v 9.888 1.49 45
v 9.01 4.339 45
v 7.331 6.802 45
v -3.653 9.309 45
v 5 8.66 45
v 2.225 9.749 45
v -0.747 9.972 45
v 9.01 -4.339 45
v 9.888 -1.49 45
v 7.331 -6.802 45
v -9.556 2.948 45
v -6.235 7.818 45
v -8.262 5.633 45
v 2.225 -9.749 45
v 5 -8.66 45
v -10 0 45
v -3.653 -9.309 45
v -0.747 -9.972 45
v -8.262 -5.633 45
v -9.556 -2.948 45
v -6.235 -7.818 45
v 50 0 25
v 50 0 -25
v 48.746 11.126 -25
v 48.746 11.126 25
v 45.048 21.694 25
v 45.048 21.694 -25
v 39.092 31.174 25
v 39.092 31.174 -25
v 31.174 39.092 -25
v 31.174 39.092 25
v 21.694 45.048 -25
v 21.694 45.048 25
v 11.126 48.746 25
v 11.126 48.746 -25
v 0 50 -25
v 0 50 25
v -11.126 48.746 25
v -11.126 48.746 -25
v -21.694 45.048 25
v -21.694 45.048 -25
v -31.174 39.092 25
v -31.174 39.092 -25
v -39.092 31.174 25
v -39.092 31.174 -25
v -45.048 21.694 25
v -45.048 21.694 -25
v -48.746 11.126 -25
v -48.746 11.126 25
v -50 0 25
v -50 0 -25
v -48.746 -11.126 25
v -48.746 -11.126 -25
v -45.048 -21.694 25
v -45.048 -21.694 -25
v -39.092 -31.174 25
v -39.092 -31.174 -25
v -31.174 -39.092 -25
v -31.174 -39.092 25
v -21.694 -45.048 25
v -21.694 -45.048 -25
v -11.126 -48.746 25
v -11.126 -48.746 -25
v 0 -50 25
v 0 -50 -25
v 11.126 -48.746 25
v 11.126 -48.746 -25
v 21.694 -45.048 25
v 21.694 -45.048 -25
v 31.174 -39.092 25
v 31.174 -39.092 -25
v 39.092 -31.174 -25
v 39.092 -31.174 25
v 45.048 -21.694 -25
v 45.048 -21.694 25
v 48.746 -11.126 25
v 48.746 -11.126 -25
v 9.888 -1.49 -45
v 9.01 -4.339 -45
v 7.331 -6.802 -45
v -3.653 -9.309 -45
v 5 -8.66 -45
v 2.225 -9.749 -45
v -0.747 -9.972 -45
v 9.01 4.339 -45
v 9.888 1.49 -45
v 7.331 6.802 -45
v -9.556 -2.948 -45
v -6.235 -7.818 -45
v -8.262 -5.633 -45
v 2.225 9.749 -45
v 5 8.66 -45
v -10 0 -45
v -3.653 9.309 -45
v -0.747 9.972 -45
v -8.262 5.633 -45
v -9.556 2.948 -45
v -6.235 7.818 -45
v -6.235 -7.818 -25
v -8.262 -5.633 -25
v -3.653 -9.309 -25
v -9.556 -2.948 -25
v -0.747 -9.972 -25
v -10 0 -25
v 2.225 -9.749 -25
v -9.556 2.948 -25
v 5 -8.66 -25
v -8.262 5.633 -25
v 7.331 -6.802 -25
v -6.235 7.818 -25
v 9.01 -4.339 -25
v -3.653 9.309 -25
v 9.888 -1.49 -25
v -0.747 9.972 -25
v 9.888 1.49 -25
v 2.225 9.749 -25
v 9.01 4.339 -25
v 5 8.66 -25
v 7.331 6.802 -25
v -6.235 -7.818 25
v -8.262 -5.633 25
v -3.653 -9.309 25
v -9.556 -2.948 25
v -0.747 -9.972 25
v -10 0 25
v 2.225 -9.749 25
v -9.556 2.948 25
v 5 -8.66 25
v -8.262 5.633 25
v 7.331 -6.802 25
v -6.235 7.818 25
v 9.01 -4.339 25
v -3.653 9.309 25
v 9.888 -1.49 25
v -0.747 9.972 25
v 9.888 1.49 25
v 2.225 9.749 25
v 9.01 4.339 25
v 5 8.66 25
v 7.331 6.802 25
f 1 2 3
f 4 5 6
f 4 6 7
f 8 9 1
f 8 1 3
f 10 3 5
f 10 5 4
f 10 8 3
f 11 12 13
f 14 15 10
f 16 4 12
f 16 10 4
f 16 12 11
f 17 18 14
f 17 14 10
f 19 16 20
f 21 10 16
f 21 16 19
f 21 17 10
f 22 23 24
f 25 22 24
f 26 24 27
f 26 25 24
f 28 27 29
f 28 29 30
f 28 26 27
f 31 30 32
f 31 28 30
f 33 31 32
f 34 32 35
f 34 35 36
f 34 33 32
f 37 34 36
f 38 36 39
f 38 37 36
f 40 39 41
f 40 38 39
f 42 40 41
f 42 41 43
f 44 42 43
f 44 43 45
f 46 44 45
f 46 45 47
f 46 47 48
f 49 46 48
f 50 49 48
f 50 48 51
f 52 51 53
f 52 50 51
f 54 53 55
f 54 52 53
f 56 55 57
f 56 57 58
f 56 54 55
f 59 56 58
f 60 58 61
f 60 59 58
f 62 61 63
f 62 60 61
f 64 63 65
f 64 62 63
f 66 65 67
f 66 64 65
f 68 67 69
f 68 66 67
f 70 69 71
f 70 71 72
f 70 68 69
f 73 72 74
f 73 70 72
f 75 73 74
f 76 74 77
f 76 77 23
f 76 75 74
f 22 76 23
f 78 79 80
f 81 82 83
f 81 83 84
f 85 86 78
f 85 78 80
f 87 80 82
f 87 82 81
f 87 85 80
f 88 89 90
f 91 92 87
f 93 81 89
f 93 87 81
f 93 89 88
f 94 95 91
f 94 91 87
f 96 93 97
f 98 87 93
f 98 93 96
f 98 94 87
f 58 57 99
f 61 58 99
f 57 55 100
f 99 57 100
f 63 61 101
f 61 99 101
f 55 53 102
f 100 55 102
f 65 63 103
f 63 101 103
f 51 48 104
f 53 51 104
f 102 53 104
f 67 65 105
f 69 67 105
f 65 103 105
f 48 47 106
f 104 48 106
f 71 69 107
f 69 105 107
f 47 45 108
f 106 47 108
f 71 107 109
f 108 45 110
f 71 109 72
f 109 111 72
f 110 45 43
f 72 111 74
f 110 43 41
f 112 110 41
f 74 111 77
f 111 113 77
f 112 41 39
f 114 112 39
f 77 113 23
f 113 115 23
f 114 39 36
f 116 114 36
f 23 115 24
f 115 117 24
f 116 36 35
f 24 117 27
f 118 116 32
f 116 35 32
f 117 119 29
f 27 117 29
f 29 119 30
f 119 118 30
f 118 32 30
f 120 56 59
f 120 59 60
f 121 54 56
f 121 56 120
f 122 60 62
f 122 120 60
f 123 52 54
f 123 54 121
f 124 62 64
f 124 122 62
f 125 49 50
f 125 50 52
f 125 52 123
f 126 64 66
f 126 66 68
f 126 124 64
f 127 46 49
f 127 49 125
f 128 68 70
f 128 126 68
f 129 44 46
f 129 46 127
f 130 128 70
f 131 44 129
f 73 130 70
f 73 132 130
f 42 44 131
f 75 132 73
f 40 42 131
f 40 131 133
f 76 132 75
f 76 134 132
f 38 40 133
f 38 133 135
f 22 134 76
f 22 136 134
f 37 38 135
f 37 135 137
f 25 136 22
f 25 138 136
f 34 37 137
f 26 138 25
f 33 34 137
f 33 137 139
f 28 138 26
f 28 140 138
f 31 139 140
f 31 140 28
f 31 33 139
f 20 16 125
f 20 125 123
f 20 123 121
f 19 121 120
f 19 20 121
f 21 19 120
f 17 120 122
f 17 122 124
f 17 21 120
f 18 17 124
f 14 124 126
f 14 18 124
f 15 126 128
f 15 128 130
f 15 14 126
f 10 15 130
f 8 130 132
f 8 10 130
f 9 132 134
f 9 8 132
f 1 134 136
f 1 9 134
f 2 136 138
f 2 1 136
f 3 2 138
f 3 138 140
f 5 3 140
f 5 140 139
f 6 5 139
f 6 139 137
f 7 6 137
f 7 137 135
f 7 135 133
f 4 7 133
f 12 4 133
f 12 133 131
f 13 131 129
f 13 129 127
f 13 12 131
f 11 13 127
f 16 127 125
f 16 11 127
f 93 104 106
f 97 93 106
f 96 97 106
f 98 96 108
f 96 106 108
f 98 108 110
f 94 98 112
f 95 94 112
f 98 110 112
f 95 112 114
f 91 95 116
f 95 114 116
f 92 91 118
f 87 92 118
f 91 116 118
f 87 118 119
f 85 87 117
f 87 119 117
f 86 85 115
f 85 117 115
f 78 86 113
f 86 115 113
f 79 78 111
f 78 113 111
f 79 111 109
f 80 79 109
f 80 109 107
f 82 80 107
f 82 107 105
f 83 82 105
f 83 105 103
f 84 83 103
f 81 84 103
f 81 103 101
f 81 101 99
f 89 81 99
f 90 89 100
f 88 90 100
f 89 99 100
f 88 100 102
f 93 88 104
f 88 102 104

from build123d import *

# Parameters (mm, degrees)
SKETCH1_R           = 50
BOSS_EXTRUDE1_DEPTH = 25
SKETCH2_R           = 10
BOSS_EXTRUDE2_DEPTH = 20
BOSS_EXTRUDE3_START = 20
SKETCH3_R           = 10
BOSS_EXTRUDE3_DEPTH = 20


with BuildPart() as part:
    # Sketch1 → Boss-Extrude1 (new, symmetric)
    with BuildSketch(Plane.XY):
        Circle(SKETCH1_R)
    extrude(amount=BOSS_EXTRUDE1_DEPTH, both=True)

    # Sketch2 → Boss-Extrude2 (add)
    with BuildSketch(Plane(origin=(0, 0, -25), x_dir=(-1, 0, 0), z_dir=(0, 0, -1))):
        Circle(SKETCH2_R)
    extrude(amount=BOSS_EXTRUDE2_DEPTH)

    # Sketch3 → Boss-Extrude3 (add)
    with BuildSketch(Plane.XY.offset(25).offset(BOSS_EXTRUDE3_START)):
        with Locations(Location((0, 0, 0), (0, 0, 180))):
            Circle(SKETCH3_R)
    extrude(amount=-BOSS_EXTRUDE3_DEPTH)


solid = part.part
